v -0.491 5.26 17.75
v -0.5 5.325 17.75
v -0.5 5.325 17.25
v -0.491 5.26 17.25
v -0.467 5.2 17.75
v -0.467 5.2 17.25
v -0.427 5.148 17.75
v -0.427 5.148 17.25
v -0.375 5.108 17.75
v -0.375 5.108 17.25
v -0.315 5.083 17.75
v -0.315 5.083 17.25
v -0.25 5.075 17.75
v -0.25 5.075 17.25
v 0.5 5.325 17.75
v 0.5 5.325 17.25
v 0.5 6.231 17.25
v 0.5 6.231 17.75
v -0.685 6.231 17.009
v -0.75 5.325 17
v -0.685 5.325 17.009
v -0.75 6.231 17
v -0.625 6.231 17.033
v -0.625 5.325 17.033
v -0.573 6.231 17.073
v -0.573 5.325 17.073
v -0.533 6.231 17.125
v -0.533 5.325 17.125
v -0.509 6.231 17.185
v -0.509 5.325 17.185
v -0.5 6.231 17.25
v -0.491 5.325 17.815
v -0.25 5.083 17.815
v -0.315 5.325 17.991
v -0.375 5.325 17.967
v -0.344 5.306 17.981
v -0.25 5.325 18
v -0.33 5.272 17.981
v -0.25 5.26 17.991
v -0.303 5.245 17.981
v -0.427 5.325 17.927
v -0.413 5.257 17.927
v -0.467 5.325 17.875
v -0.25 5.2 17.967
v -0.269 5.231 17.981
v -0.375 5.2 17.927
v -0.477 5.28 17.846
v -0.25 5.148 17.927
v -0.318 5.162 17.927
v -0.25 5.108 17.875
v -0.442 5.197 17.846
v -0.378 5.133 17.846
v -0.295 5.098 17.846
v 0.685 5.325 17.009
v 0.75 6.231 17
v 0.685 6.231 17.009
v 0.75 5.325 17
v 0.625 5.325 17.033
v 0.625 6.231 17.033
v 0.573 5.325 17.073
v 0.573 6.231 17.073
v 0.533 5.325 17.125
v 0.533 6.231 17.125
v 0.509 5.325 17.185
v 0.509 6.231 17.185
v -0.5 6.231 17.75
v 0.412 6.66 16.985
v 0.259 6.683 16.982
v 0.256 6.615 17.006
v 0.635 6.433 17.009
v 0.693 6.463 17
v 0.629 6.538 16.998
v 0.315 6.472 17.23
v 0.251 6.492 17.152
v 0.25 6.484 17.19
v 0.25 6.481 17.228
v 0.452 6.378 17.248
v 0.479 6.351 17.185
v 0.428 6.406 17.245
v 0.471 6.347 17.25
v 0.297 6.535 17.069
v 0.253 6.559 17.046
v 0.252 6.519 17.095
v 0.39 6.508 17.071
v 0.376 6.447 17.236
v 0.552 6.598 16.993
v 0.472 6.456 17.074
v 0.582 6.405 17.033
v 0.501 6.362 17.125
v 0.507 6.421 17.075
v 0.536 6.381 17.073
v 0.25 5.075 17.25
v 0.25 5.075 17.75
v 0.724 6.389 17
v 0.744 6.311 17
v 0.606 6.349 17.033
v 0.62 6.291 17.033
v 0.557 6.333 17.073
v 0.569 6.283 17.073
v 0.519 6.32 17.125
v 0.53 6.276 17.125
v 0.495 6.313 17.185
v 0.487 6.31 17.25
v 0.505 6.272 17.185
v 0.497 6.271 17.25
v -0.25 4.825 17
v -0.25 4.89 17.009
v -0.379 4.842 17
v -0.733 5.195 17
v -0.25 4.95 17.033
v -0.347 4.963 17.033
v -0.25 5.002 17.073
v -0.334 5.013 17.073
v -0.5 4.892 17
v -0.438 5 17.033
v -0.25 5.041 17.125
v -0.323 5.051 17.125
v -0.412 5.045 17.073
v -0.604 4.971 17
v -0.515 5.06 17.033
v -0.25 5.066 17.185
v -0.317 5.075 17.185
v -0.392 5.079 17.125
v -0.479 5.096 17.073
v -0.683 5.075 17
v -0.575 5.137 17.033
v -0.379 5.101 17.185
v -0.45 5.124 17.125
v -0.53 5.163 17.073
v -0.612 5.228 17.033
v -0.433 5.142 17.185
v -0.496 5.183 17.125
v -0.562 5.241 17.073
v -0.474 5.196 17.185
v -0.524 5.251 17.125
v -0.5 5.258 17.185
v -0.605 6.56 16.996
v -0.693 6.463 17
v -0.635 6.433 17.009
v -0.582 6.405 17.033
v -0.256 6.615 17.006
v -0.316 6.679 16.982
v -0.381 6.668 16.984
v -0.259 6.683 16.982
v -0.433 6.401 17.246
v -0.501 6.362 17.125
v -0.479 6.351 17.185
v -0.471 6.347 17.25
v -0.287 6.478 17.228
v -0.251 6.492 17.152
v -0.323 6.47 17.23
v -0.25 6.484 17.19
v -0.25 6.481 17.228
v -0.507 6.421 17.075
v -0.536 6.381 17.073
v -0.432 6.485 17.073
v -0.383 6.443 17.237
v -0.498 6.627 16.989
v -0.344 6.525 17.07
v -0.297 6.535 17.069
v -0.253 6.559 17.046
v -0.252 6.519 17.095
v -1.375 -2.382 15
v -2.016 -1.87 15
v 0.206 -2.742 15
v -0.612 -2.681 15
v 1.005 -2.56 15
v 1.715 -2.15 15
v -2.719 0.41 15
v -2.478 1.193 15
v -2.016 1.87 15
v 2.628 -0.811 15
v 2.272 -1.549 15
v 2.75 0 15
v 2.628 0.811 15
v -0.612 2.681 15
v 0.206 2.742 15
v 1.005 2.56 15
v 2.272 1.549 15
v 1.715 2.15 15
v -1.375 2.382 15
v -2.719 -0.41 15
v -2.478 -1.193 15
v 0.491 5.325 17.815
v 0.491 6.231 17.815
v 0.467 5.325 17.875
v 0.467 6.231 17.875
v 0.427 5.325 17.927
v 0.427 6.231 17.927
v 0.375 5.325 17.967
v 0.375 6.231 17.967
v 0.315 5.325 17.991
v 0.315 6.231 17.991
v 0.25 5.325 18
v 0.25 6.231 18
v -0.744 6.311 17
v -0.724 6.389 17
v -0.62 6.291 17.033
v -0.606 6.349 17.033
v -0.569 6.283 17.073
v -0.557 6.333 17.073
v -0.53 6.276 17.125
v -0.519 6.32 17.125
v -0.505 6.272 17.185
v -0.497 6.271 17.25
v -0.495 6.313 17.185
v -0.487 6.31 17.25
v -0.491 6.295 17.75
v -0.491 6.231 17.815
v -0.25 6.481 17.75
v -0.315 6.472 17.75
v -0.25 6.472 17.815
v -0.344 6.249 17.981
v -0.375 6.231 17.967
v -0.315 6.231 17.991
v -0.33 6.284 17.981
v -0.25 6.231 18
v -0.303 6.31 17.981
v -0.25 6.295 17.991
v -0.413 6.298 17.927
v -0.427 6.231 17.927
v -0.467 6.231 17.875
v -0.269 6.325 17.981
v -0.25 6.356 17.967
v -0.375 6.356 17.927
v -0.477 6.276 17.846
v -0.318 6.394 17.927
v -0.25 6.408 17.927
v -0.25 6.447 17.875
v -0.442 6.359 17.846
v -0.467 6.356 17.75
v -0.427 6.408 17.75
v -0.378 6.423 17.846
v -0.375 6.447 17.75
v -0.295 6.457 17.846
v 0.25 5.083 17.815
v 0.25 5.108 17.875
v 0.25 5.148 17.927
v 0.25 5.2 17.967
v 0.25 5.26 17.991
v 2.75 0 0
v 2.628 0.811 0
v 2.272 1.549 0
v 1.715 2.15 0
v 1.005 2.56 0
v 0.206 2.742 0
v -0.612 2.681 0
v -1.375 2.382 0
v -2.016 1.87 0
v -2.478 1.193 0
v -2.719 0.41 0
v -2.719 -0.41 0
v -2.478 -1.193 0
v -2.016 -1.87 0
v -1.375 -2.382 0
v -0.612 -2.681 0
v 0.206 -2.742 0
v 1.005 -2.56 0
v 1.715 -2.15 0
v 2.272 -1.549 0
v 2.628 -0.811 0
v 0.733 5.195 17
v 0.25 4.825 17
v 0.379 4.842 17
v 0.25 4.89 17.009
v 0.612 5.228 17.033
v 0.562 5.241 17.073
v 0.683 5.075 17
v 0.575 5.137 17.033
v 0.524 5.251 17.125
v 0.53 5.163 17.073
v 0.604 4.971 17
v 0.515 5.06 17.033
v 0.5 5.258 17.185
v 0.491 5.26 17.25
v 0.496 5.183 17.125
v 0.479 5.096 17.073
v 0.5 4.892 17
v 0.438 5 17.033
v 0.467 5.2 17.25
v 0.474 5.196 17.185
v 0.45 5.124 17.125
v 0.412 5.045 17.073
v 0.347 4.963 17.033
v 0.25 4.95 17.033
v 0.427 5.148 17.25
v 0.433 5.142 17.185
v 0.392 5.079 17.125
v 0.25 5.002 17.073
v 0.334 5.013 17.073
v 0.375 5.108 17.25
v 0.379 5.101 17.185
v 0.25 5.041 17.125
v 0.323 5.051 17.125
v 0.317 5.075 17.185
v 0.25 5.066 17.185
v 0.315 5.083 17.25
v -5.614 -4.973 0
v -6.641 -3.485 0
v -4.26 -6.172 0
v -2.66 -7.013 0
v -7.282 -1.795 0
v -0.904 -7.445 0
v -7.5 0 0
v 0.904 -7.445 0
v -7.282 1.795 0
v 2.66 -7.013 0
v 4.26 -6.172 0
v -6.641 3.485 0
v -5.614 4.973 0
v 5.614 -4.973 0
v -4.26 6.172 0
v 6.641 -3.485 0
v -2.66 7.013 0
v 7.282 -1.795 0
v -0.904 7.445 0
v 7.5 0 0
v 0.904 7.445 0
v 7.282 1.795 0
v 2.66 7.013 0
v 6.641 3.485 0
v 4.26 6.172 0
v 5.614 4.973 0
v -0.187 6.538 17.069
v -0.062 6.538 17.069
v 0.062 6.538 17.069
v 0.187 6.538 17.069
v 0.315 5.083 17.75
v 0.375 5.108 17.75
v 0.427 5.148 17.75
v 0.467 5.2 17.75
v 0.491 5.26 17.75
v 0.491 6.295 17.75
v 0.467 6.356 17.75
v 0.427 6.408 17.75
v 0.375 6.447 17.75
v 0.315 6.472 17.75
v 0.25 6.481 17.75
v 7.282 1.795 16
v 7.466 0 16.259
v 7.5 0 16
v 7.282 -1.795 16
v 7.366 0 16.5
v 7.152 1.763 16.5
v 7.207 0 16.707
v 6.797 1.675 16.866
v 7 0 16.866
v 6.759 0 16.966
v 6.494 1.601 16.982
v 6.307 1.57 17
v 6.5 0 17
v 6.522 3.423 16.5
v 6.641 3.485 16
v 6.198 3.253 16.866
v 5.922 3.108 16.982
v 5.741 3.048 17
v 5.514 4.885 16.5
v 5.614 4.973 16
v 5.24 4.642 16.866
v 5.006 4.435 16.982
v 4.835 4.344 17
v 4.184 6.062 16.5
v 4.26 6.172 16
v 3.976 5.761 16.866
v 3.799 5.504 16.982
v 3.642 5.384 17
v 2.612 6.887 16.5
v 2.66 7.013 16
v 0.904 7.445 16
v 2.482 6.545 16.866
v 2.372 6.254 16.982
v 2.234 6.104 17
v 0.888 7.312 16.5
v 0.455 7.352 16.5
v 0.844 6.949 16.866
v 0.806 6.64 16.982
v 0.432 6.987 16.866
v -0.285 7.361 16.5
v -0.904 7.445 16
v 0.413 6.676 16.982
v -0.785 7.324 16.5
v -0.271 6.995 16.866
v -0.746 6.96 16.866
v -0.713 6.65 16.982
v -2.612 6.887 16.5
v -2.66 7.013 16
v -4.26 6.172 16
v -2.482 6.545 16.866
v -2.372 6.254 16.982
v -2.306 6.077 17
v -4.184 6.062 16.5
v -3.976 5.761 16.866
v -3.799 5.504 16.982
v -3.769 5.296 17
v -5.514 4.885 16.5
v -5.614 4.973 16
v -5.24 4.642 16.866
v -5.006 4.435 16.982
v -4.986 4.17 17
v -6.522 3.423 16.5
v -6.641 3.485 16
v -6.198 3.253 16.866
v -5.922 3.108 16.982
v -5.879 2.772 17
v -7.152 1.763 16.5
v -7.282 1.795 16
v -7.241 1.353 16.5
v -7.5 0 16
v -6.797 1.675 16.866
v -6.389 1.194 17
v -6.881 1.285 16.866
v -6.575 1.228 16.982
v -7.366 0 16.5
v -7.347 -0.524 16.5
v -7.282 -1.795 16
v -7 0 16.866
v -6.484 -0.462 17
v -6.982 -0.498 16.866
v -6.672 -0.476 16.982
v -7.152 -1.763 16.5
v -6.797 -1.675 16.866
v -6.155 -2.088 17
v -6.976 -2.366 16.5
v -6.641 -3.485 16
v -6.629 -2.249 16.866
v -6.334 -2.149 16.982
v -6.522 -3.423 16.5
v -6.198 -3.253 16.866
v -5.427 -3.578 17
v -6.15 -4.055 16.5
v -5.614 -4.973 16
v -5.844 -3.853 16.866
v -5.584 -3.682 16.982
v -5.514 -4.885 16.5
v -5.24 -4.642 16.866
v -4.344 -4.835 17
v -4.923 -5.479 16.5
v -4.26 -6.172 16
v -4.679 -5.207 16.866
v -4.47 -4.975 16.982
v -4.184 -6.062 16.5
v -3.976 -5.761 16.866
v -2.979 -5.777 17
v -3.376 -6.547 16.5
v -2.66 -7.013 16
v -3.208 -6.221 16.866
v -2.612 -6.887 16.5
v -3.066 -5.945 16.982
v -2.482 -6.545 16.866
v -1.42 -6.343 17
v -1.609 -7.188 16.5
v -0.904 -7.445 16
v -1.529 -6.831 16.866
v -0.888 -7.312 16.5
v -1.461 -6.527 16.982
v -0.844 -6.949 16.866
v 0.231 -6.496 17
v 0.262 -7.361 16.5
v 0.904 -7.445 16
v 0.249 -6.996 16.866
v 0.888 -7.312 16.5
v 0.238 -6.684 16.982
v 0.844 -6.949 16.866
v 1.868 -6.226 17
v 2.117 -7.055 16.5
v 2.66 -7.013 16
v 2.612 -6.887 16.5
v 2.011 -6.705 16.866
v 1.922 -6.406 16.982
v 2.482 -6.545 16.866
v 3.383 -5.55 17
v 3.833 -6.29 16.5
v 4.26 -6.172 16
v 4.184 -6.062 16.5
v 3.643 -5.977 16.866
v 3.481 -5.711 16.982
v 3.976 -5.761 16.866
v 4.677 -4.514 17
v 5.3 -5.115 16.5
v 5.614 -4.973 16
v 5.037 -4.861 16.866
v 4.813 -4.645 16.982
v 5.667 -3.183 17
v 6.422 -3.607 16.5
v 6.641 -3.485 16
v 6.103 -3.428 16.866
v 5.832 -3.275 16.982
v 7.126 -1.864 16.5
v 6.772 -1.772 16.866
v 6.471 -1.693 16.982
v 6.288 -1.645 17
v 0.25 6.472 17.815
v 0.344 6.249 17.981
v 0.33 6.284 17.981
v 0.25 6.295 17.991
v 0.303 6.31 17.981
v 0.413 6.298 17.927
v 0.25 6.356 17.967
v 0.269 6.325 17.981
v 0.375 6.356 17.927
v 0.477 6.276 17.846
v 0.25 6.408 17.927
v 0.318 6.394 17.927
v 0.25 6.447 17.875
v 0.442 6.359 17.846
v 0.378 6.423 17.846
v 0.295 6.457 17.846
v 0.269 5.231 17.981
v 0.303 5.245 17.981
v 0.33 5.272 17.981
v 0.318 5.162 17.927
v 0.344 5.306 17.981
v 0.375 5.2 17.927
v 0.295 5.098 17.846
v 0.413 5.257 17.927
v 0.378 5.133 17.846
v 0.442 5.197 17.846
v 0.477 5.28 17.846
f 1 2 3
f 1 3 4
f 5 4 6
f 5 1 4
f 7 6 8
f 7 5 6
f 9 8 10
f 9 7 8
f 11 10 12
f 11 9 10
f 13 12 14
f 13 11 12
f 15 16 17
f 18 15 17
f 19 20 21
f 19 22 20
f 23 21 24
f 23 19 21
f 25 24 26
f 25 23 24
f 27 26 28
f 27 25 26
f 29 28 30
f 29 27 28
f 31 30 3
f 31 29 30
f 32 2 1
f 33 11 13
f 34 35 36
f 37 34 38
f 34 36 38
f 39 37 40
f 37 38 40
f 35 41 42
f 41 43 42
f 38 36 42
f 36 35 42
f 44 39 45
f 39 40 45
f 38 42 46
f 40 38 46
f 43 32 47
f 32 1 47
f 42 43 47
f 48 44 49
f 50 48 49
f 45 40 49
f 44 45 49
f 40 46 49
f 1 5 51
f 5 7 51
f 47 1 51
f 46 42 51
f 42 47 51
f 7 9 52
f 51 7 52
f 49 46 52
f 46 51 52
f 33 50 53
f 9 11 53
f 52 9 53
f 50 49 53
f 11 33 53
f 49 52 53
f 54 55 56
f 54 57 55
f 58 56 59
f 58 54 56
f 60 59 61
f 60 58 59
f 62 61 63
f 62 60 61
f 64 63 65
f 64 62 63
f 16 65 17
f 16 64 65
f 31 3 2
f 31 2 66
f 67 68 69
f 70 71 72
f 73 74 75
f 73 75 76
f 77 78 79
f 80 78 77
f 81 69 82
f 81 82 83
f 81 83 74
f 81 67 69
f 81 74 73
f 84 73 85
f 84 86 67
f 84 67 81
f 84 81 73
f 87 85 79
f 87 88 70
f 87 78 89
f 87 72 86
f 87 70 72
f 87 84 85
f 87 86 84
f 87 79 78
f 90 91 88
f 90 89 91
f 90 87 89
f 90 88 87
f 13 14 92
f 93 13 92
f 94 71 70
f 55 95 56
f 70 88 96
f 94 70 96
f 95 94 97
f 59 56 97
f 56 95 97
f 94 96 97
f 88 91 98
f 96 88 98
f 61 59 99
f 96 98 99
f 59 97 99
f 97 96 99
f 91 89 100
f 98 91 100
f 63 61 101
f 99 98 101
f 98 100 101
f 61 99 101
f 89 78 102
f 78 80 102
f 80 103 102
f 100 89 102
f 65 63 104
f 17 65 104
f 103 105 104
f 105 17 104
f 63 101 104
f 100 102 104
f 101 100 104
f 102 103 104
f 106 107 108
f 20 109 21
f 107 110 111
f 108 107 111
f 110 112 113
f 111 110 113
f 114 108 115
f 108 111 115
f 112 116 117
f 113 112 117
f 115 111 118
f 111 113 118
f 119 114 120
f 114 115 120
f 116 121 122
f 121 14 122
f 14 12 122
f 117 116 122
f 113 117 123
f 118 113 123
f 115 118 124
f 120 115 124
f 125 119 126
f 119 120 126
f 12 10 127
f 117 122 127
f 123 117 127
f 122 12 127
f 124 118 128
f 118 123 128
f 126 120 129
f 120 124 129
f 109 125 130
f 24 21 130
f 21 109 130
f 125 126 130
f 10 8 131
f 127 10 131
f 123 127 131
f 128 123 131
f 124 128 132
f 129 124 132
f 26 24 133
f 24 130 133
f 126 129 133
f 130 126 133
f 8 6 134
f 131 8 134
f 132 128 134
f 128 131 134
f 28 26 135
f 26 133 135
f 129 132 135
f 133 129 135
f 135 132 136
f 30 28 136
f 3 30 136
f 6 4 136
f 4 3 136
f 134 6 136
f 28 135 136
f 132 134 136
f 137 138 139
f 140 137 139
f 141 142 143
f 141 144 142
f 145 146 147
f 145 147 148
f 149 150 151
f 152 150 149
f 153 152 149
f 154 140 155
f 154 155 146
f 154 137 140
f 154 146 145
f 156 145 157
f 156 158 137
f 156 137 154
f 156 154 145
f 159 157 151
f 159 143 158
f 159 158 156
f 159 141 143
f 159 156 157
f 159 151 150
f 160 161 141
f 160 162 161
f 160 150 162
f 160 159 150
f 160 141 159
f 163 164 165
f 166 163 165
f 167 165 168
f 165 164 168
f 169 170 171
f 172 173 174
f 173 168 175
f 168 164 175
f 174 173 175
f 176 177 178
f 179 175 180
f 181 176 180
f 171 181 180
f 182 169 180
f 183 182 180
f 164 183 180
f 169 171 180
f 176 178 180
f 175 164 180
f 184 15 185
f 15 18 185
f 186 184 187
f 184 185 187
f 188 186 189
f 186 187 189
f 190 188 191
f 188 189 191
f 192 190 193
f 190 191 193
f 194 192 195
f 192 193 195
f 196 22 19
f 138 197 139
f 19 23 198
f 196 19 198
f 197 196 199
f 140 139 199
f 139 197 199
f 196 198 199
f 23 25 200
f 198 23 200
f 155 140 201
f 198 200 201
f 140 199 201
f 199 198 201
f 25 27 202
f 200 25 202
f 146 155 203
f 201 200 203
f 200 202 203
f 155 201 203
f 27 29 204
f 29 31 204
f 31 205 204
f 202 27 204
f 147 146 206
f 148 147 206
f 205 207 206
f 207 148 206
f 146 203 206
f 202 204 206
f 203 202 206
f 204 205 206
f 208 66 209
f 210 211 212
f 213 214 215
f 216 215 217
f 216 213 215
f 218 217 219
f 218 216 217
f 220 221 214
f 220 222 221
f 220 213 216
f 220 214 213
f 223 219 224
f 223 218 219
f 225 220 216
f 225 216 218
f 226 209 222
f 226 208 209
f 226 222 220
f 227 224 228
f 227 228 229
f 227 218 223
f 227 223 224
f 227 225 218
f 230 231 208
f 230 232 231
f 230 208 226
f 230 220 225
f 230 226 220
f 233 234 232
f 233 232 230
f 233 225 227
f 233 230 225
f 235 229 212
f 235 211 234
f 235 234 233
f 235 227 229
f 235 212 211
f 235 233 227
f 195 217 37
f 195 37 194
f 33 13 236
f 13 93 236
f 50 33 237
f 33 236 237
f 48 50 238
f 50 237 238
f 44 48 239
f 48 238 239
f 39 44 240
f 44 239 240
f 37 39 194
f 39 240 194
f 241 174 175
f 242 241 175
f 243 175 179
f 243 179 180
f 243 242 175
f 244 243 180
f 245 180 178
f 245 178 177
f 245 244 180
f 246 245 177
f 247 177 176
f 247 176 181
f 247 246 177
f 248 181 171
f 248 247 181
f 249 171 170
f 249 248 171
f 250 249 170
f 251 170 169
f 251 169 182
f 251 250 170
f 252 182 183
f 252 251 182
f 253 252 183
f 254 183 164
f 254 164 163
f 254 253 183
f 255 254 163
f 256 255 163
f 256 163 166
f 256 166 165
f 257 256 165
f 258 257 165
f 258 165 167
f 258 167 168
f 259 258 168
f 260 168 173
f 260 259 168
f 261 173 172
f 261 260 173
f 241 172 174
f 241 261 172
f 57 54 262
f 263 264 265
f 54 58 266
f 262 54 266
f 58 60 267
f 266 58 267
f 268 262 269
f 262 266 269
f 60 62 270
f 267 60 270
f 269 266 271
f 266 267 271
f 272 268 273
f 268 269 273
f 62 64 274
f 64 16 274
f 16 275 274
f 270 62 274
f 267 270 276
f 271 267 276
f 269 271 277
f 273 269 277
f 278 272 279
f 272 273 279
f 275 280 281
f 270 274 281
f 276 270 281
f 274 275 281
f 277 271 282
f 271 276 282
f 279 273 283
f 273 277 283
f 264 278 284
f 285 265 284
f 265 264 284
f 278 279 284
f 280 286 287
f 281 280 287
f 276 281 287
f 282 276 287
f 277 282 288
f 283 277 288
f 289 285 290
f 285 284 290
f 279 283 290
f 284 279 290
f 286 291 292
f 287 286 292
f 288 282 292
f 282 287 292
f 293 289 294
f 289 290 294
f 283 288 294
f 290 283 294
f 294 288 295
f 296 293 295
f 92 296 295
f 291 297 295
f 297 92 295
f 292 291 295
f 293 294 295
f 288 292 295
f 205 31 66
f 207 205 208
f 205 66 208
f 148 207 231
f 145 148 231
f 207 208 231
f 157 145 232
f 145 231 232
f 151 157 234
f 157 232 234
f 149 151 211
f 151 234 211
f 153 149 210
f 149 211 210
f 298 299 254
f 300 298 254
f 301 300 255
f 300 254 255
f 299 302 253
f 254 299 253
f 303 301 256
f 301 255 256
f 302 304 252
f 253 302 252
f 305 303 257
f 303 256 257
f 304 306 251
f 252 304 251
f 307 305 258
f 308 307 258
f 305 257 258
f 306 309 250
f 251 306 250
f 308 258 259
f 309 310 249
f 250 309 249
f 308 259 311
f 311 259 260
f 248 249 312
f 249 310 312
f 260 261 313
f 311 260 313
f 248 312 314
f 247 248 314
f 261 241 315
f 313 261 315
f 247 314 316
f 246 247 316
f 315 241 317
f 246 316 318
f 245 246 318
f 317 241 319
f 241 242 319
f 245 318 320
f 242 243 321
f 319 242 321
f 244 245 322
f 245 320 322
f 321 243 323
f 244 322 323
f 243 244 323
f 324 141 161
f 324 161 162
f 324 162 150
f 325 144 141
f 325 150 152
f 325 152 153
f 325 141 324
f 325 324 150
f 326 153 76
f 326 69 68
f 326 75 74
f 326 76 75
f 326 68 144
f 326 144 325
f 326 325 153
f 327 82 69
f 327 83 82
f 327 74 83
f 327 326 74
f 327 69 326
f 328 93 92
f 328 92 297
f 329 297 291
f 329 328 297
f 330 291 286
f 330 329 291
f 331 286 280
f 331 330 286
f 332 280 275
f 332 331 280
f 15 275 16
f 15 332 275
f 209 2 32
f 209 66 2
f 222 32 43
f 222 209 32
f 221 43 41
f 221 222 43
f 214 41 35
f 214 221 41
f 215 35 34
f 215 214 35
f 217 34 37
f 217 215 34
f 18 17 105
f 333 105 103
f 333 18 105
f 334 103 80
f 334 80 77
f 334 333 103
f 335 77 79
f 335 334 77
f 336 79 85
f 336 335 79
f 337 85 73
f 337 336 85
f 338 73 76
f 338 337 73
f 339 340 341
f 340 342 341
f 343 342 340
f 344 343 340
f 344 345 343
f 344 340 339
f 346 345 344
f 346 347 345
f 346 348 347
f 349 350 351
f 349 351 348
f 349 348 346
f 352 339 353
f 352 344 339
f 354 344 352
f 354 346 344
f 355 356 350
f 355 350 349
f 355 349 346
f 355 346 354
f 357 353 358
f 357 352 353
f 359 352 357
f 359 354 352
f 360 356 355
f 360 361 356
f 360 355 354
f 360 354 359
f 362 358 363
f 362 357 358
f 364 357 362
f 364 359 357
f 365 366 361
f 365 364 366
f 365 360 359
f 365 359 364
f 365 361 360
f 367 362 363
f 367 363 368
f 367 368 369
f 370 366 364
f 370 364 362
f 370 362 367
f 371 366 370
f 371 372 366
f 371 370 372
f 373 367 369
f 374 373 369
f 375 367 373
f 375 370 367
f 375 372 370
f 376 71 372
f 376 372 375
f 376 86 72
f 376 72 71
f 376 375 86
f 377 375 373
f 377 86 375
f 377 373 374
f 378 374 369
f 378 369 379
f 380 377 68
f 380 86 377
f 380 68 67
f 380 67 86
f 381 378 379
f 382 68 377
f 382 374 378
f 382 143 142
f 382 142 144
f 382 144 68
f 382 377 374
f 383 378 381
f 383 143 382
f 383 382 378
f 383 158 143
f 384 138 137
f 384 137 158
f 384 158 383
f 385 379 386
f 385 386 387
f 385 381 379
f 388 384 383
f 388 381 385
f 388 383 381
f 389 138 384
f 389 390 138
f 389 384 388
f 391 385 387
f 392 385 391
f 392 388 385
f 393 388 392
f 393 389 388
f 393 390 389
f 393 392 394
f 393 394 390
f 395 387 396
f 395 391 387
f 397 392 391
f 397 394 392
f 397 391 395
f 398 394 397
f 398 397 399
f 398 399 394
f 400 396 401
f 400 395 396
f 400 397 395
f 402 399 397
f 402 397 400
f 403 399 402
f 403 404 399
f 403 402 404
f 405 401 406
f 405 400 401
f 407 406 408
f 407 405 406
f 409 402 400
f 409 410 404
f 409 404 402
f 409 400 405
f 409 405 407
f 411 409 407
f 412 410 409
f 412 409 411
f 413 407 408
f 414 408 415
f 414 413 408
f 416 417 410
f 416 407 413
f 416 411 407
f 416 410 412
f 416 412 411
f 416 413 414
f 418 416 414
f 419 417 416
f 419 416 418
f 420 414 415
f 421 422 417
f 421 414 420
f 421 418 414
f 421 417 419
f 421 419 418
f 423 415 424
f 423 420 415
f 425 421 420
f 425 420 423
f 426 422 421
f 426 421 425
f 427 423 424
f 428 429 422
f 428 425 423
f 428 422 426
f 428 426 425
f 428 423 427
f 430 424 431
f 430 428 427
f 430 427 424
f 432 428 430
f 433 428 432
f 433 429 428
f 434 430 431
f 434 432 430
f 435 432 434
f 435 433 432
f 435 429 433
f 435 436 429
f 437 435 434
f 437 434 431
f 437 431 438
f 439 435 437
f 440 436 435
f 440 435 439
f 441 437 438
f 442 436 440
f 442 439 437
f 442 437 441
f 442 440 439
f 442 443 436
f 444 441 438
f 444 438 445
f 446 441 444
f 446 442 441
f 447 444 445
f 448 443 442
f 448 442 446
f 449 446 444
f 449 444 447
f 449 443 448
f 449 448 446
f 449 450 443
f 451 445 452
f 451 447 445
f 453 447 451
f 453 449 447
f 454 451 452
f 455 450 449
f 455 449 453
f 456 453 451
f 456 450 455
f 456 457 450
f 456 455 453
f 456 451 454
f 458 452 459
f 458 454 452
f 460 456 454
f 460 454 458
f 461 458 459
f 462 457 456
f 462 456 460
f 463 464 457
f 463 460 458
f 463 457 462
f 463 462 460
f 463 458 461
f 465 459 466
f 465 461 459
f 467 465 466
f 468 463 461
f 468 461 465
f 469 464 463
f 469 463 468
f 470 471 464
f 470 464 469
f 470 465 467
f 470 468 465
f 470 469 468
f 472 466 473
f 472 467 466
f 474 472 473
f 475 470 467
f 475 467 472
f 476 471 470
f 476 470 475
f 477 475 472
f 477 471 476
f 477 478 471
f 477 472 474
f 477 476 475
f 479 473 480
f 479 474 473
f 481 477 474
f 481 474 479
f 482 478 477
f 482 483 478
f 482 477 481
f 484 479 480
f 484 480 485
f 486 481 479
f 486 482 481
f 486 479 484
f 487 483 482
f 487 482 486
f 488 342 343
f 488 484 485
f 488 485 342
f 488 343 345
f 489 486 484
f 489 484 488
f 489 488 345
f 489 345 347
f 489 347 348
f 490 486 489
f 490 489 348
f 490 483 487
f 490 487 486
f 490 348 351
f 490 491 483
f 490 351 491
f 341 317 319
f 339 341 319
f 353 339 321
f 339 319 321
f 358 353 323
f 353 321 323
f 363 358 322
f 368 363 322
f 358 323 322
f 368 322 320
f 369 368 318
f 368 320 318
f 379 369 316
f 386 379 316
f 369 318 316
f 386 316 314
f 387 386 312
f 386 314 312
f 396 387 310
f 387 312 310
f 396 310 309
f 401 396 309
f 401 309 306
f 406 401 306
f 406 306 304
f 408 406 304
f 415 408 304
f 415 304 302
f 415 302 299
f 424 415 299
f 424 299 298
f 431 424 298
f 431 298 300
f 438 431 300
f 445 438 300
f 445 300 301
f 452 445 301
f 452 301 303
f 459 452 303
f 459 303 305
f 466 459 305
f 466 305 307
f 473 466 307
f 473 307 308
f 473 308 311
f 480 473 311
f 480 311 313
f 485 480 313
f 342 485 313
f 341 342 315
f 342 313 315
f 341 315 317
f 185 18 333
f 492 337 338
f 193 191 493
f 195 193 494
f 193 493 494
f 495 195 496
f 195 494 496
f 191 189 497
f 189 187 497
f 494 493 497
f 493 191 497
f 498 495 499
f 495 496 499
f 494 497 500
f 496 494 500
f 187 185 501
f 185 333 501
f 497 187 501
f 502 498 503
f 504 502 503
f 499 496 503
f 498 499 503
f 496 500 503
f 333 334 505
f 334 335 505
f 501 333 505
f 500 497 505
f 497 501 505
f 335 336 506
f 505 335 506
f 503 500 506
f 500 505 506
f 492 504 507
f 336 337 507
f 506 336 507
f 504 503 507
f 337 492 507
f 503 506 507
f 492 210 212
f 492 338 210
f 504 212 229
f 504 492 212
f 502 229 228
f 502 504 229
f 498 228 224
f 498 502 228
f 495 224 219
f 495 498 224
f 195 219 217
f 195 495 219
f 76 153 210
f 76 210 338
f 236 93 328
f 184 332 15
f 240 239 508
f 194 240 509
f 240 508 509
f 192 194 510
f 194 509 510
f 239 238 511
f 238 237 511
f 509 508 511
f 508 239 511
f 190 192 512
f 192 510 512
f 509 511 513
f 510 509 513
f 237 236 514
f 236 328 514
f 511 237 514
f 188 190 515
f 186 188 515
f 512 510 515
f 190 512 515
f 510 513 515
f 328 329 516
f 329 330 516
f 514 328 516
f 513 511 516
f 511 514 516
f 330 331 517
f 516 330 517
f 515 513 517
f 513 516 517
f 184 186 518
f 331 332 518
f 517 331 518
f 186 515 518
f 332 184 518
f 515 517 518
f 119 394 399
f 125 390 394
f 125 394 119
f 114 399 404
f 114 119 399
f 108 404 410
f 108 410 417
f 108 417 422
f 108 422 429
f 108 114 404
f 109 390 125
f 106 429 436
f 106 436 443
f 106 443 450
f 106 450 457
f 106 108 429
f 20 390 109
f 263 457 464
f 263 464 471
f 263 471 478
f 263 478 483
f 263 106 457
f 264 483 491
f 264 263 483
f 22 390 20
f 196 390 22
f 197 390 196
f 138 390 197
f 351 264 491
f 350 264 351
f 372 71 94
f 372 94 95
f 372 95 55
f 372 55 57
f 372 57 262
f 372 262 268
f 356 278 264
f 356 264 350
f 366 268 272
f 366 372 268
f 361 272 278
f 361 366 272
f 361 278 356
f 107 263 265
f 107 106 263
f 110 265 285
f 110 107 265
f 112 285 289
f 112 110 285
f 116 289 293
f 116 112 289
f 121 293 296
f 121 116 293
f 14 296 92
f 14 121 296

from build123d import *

# Parameters (mm, degrees)
ESQUISSE1_R        = 7.5
ESQUISSE1_R_2      = 2.75
BOSS_EXTRU_1_DEPTH = 15
ESQUISSE2_R        = 7.5
BOSS_EXTRU_2_DEPTH = 2
CONG_1_R           = 1
ESQUISSE3_W        = 1
ESQUISSE3_H        = 1.40589343
BOSS_EXTRU_3_DEPTH = 1
CONG_2_R           = 0.25
CONG_3_R           = 0.25


with BuildPart() as part:
    # Esquisse1 → Boss.-Extru.1 (new body)
    with BuildSketch(Plane.XY):
        Circle(ESQUISSE1_R)
        Circle(ESQUISSE1_R_2, mode=Mode.SUBTRACT)
    extrude(amount=BOSS_EXTRU_1_DEPTH)

    # Esquisse2 → Boss.-Extru.2 (add)
    with BuildSketch(Plane.XY.offset(15)):
        Circle(ESQUISSE2_R)
    extrude(amount=BOSS_EXTRU_2_DEPTH)

    # Congé1
    cong_1_edges = [part.edges().sort_by_distance(p)[0] for p in [
        (-7.5, 0, 17),
    ]]
    fillet(cong_1_edges, radius=CONG_1_R)

    # Esquisse3 → Boss.-Extru.3 (add)
    with BuildSketch(Plane.XY.offset(17)):
        with Locations((0, 5.777793983)):
            Rectangle(ESQUISSE3_W, ESQUISSE3_H)
    extrude(amount=BOSS_EXTRU_3_DEPTH)

    # Congé2
    cong_2_edges = [part.edges().sort_by_distance(p)[0] for p in [
        (-0.5, 6.480740698, 17.5),
        (-0.5, 5.074847268, 17.5),
        (0.5, 5.074847268, 17.5),
        (0.5, 6.480740698, 17.5),
        (-0.5, 5.777793983, 18),
        (0, 5.074847268, 18),
        (0.5, 5.777793983, 18),
        (0, 6.480740698, 18),
    ]]
    fillet(cong_2_edges, radius=CONG_2_R)

    # Congé3
    cong_3_edges = [part.edges().sort_by_distance(p)[0] for p in [
        (0, 6.480740698, 17),
        (-0.5, 5.777793983, 17),
        (0.5, 5.777793983, 17),
        (0, 5.074847268, 17),
        (-0.426776695, 6.407517394, 17),
        (0.426776695, 6.407517394, 17),
        (-0.426776695, 5.148070573, 17),
        (0.426776695, 5.148070573, 17),
    ]]
    fillet(cong_3_edges, radius=CONG_3_R)


solid = part.part
